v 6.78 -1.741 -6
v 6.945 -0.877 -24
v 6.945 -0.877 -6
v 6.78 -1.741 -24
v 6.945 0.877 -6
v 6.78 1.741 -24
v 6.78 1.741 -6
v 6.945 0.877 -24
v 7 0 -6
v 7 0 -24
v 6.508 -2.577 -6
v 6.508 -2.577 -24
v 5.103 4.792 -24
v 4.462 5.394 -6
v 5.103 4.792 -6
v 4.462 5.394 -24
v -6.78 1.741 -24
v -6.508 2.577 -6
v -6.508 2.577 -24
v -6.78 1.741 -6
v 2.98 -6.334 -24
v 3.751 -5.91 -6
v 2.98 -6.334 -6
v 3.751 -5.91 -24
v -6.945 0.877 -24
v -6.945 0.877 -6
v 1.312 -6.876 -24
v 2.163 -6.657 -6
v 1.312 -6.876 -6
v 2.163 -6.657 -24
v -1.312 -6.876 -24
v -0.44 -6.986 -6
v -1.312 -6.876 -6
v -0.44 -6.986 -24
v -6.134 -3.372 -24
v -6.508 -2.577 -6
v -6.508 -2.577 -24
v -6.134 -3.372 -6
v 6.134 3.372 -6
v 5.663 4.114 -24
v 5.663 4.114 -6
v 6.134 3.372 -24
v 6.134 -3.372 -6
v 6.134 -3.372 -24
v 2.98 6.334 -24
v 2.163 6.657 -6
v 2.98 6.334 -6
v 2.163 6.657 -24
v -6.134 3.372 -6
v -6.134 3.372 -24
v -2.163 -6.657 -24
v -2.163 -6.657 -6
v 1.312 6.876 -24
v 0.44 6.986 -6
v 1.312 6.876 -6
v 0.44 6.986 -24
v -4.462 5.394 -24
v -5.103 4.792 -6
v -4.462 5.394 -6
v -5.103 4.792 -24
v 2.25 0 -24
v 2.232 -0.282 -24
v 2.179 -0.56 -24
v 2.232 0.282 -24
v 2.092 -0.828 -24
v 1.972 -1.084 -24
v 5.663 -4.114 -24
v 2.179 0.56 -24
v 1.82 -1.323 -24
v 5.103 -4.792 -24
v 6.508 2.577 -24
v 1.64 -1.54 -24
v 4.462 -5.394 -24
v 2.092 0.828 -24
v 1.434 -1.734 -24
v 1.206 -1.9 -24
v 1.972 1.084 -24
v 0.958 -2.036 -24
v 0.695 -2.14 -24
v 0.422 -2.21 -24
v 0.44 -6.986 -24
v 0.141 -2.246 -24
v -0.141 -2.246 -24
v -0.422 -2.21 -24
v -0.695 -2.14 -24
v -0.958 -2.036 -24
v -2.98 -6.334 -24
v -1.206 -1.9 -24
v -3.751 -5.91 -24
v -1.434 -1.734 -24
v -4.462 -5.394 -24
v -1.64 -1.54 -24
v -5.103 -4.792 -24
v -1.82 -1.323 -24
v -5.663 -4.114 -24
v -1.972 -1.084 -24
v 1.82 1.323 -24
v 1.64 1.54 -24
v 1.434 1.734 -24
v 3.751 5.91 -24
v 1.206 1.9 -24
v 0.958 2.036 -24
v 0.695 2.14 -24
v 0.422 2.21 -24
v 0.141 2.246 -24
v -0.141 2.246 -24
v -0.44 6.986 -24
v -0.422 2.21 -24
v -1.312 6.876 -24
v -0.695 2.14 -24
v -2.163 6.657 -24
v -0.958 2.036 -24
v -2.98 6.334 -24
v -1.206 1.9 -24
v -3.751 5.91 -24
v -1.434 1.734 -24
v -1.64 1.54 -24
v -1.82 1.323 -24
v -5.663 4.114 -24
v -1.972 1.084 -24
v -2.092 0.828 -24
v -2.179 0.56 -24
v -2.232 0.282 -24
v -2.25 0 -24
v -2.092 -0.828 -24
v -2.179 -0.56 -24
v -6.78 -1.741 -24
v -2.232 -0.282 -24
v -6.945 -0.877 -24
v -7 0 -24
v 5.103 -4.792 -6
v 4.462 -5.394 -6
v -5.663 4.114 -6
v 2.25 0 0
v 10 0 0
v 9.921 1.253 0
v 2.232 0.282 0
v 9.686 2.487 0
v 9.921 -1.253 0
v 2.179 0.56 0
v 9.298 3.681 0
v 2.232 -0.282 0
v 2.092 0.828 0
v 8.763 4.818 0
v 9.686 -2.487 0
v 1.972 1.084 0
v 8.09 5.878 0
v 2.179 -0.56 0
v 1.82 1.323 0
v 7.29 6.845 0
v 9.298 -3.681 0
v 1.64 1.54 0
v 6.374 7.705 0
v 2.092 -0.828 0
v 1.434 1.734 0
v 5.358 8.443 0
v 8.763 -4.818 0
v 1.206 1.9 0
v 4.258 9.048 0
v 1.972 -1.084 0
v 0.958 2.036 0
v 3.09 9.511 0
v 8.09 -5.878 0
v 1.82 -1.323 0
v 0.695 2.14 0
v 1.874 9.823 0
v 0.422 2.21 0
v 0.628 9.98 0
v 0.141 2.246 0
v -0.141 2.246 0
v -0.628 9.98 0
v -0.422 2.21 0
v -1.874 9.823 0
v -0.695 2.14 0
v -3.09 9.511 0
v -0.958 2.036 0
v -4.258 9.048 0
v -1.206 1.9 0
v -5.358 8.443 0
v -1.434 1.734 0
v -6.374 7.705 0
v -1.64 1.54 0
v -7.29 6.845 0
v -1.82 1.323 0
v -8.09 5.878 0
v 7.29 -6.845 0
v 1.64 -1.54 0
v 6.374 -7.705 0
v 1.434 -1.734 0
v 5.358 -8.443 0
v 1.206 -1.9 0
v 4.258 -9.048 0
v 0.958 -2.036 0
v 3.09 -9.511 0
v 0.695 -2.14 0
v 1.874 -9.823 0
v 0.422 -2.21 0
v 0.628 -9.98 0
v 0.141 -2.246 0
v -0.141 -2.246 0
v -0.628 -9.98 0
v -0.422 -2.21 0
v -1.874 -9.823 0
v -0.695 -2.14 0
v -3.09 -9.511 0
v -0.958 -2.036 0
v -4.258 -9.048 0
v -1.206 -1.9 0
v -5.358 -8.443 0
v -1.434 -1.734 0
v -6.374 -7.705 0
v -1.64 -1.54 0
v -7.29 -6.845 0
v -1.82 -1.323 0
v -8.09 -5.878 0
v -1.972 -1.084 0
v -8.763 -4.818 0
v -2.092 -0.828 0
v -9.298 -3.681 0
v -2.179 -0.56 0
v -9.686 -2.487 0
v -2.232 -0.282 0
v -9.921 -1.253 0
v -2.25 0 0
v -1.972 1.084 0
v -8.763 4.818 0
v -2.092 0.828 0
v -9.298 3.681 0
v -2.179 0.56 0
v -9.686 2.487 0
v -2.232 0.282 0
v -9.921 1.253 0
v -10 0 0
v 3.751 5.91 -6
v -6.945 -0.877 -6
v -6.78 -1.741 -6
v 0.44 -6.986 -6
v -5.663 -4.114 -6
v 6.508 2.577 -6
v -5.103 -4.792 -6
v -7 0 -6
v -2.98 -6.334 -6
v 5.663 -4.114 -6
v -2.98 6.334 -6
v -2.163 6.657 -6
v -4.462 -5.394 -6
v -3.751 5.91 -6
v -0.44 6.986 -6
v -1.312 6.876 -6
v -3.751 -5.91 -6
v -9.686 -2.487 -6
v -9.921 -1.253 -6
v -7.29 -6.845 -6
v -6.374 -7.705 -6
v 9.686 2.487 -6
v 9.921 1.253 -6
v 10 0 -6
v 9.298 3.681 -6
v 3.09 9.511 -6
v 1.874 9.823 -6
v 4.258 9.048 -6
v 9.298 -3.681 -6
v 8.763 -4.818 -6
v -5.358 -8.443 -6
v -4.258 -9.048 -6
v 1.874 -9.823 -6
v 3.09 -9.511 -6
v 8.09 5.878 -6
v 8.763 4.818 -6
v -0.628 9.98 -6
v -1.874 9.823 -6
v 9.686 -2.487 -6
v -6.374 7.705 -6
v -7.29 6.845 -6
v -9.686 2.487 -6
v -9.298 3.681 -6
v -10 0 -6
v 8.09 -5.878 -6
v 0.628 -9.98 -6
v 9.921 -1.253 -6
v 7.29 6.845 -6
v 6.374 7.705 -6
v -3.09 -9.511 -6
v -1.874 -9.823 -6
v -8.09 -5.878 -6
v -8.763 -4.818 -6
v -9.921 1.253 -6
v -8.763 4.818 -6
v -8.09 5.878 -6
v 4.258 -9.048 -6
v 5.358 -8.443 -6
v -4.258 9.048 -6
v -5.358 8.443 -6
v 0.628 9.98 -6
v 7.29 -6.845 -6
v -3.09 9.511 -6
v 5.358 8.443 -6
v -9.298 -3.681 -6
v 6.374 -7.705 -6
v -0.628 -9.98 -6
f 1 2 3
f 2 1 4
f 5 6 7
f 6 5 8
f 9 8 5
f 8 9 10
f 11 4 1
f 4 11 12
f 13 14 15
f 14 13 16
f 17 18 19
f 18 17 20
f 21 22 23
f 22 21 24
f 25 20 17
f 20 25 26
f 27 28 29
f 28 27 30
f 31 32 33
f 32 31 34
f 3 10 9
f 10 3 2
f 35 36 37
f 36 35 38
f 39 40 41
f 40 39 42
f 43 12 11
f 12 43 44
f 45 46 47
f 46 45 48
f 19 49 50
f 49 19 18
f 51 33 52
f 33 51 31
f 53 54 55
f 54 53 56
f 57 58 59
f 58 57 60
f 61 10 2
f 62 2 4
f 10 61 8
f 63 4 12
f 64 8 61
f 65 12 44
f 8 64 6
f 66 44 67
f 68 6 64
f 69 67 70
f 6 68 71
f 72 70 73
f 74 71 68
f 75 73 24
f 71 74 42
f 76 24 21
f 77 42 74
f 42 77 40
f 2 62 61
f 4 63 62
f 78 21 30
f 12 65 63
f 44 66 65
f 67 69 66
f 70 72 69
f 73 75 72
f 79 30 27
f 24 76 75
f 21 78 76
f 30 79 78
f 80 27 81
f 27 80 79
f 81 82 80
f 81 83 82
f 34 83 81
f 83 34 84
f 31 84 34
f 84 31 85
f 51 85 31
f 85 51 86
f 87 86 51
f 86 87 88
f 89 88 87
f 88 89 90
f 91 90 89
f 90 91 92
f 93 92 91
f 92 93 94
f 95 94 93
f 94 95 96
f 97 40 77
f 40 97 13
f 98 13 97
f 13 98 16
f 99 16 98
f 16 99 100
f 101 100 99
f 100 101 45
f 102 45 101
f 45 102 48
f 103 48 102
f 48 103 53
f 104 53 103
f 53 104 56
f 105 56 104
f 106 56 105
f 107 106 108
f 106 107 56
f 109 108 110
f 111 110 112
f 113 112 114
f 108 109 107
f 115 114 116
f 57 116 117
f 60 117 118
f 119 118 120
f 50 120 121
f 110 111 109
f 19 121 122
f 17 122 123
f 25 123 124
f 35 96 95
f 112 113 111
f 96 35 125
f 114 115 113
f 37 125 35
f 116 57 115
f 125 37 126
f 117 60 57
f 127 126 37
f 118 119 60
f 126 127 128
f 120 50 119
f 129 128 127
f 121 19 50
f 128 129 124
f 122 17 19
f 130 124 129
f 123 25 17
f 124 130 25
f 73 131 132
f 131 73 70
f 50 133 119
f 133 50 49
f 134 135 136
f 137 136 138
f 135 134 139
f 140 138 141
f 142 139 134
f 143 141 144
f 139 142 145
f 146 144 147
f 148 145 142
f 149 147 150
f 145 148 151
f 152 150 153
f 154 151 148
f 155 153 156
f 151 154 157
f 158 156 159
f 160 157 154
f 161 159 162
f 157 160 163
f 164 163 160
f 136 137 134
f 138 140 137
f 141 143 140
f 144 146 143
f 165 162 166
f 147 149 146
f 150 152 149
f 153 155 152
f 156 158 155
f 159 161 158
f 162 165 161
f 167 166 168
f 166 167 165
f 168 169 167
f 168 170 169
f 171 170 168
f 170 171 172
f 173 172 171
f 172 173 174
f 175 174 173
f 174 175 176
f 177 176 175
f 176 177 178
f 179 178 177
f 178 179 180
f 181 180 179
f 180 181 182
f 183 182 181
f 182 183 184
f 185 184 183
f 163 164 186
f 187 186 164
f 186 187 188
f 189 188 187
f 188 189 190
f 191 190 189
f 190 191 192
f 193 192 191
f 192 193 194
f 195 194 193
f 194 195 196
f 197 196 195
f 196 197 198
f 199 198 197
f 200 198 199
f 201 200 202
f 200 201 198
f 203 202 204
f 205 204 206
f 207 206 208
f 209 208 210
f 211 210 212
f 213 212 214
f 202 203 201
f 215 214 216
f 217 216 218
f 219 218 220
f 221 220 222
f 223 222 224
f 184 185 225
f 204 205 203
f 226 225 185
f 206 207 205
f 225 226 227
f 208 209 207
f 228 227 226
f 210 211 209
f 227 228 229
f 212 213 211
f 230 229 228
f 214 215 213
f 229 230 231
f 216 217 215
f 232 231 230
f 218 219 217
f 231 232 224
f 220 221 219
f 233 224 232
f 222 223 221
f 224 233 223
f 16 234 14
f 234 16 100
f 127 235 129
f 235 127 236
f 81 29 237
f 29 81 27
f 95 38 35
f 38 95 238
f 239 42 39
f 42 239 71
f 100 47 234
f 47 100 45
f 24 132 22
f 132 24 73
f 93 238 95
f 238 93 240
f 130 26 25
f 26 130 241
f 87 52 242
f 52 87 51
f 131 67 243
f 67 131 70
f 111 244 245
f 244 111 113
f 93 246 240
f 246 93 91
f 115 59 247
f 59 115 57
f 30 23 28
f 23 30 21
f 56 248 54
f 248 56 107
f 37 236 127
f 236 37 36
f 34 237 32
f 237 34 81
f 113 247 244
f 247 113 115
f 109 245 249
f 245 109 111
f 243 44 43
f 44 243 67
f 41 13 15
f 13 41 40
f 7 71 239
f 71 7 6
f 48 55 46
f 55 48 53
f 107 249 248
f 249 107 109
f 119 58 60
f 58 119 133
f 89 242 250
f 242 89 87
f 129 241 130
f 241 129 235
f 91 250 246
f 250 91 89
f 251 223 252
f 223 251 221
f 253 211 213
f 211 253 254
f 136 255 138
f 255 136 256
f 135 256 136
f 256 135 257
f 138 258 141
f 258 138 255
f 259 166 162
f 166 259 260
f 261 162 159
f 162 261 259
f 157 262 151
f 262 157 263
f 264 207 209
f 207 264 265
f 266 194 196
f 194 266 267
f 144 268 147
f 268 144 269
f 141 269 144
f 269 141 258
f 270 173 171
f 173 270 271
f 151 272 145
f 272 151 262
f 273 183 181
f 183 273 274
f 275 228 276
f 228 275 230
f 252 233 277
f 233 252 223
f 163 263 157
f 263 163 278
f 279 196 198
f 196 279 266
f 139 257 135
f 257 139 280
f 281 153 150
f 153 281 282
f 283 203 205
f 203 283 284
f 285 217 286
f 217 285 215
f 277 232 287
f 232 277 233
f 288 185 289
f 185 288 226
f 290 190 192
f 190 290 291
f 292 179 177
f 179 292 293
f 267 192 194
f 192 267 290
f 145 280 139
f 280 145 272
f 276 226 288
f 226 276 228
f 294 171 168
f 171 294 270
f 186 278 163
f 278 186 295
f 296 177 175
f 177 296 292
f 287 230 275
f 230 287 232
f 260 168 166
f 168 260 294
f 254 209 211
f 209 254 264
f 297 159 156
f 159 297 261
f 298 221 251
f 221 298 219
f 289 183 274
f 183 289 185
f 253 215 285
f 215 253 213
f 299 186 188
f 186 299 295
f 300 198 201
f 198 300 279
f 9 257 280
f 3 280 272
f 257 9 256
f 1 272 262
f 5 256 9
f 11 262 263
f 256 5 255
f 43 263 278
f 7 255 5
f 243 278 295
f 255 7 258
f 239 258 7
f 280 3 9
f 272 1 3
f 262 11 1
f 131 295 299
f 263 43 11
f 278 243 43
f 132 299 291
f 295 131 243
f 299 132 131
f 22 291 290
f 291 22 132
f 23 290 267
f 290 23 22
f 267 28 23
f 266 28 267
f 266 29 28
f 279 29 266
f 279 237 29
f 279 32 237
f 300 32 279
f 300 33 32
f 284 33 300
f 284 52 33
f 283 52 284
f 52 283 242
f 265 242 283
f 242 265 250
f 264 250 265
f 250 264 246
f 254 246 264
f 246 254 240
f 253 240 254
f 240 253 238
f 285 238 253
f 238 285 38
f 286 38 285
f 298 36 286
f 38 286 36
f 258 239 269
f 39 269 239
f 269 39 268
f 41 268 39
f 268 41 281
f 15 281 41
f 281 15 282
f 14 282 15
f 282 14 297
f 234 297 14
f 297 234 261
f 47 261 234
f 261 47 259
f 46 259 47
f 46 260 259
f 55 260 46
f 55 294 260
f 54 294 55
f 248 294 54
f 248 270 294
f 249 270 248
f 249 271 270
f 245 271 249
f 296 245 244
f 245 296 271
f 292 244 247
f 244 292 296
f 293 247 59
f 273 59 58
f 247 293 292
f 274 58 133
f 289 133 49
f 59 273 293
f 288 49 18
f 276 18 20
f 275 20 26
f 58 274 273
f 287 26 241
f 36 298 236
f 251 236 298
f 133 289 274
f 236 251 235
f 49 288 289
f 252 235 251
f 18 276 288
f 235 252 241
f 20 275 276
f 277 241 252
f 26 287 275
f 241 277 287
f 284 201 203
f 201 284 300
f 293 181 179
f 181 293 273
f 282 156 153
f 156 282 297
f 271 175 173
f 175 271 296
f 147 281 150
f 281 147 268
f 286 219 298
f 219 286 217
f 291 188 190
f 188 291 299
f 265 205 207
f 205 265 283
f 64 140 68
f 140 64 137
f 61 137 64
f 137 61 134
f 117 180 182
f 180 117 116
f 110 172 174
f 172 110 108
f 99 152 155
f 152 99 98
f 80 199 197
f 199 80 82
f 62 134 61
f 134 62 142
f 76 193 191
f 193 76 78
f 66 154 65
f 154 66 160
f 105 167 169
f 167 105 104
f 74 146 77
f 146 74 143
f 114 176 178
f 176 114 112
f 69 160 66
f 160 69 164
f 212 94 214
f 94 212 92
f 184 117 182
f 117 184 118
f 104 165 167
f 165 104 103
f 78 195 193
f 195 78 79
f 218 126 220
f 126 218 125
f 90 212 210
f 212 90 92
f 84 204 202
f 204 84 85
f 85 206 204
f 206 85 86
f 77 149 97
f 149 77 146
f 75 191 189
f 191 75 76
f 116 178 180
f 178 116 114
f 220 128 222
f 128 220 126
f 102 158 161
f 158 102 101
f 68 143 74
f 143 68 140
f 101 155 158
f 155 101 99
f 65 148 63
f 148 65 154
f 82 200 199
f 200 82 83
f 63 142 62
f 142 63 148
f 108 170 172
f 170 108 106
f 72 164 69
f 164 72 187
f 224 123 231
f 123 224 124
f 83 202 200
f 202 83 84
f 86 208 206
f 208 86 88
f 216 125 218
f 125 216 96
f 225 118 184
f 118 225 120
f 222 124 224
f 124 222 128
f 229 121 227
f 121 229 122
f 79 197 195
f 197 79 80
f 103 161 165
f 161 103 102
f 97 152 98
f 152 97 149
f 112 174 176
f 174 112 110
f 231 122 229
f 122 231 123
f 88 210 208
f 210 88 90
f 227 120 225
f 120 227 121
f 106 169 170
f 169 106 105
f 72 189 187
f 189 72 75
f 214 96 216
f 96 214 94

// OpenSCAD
$fn = 50;


difference() {
	union() {
		translate(v = [0, 0, -24.0000000000]) {
			cylinder(h = 24, r = 7.0000000000);
		}
		translate(v = [0, 0, -6.0000000000]) {
			cylinder(h = 6, r = 10.0000000000);
		}
	}
	union() {
		#translate(v = [0, 0, -24]) {
			cylinder(h = 24, r = 2.2500000000);
		}
	}
}
